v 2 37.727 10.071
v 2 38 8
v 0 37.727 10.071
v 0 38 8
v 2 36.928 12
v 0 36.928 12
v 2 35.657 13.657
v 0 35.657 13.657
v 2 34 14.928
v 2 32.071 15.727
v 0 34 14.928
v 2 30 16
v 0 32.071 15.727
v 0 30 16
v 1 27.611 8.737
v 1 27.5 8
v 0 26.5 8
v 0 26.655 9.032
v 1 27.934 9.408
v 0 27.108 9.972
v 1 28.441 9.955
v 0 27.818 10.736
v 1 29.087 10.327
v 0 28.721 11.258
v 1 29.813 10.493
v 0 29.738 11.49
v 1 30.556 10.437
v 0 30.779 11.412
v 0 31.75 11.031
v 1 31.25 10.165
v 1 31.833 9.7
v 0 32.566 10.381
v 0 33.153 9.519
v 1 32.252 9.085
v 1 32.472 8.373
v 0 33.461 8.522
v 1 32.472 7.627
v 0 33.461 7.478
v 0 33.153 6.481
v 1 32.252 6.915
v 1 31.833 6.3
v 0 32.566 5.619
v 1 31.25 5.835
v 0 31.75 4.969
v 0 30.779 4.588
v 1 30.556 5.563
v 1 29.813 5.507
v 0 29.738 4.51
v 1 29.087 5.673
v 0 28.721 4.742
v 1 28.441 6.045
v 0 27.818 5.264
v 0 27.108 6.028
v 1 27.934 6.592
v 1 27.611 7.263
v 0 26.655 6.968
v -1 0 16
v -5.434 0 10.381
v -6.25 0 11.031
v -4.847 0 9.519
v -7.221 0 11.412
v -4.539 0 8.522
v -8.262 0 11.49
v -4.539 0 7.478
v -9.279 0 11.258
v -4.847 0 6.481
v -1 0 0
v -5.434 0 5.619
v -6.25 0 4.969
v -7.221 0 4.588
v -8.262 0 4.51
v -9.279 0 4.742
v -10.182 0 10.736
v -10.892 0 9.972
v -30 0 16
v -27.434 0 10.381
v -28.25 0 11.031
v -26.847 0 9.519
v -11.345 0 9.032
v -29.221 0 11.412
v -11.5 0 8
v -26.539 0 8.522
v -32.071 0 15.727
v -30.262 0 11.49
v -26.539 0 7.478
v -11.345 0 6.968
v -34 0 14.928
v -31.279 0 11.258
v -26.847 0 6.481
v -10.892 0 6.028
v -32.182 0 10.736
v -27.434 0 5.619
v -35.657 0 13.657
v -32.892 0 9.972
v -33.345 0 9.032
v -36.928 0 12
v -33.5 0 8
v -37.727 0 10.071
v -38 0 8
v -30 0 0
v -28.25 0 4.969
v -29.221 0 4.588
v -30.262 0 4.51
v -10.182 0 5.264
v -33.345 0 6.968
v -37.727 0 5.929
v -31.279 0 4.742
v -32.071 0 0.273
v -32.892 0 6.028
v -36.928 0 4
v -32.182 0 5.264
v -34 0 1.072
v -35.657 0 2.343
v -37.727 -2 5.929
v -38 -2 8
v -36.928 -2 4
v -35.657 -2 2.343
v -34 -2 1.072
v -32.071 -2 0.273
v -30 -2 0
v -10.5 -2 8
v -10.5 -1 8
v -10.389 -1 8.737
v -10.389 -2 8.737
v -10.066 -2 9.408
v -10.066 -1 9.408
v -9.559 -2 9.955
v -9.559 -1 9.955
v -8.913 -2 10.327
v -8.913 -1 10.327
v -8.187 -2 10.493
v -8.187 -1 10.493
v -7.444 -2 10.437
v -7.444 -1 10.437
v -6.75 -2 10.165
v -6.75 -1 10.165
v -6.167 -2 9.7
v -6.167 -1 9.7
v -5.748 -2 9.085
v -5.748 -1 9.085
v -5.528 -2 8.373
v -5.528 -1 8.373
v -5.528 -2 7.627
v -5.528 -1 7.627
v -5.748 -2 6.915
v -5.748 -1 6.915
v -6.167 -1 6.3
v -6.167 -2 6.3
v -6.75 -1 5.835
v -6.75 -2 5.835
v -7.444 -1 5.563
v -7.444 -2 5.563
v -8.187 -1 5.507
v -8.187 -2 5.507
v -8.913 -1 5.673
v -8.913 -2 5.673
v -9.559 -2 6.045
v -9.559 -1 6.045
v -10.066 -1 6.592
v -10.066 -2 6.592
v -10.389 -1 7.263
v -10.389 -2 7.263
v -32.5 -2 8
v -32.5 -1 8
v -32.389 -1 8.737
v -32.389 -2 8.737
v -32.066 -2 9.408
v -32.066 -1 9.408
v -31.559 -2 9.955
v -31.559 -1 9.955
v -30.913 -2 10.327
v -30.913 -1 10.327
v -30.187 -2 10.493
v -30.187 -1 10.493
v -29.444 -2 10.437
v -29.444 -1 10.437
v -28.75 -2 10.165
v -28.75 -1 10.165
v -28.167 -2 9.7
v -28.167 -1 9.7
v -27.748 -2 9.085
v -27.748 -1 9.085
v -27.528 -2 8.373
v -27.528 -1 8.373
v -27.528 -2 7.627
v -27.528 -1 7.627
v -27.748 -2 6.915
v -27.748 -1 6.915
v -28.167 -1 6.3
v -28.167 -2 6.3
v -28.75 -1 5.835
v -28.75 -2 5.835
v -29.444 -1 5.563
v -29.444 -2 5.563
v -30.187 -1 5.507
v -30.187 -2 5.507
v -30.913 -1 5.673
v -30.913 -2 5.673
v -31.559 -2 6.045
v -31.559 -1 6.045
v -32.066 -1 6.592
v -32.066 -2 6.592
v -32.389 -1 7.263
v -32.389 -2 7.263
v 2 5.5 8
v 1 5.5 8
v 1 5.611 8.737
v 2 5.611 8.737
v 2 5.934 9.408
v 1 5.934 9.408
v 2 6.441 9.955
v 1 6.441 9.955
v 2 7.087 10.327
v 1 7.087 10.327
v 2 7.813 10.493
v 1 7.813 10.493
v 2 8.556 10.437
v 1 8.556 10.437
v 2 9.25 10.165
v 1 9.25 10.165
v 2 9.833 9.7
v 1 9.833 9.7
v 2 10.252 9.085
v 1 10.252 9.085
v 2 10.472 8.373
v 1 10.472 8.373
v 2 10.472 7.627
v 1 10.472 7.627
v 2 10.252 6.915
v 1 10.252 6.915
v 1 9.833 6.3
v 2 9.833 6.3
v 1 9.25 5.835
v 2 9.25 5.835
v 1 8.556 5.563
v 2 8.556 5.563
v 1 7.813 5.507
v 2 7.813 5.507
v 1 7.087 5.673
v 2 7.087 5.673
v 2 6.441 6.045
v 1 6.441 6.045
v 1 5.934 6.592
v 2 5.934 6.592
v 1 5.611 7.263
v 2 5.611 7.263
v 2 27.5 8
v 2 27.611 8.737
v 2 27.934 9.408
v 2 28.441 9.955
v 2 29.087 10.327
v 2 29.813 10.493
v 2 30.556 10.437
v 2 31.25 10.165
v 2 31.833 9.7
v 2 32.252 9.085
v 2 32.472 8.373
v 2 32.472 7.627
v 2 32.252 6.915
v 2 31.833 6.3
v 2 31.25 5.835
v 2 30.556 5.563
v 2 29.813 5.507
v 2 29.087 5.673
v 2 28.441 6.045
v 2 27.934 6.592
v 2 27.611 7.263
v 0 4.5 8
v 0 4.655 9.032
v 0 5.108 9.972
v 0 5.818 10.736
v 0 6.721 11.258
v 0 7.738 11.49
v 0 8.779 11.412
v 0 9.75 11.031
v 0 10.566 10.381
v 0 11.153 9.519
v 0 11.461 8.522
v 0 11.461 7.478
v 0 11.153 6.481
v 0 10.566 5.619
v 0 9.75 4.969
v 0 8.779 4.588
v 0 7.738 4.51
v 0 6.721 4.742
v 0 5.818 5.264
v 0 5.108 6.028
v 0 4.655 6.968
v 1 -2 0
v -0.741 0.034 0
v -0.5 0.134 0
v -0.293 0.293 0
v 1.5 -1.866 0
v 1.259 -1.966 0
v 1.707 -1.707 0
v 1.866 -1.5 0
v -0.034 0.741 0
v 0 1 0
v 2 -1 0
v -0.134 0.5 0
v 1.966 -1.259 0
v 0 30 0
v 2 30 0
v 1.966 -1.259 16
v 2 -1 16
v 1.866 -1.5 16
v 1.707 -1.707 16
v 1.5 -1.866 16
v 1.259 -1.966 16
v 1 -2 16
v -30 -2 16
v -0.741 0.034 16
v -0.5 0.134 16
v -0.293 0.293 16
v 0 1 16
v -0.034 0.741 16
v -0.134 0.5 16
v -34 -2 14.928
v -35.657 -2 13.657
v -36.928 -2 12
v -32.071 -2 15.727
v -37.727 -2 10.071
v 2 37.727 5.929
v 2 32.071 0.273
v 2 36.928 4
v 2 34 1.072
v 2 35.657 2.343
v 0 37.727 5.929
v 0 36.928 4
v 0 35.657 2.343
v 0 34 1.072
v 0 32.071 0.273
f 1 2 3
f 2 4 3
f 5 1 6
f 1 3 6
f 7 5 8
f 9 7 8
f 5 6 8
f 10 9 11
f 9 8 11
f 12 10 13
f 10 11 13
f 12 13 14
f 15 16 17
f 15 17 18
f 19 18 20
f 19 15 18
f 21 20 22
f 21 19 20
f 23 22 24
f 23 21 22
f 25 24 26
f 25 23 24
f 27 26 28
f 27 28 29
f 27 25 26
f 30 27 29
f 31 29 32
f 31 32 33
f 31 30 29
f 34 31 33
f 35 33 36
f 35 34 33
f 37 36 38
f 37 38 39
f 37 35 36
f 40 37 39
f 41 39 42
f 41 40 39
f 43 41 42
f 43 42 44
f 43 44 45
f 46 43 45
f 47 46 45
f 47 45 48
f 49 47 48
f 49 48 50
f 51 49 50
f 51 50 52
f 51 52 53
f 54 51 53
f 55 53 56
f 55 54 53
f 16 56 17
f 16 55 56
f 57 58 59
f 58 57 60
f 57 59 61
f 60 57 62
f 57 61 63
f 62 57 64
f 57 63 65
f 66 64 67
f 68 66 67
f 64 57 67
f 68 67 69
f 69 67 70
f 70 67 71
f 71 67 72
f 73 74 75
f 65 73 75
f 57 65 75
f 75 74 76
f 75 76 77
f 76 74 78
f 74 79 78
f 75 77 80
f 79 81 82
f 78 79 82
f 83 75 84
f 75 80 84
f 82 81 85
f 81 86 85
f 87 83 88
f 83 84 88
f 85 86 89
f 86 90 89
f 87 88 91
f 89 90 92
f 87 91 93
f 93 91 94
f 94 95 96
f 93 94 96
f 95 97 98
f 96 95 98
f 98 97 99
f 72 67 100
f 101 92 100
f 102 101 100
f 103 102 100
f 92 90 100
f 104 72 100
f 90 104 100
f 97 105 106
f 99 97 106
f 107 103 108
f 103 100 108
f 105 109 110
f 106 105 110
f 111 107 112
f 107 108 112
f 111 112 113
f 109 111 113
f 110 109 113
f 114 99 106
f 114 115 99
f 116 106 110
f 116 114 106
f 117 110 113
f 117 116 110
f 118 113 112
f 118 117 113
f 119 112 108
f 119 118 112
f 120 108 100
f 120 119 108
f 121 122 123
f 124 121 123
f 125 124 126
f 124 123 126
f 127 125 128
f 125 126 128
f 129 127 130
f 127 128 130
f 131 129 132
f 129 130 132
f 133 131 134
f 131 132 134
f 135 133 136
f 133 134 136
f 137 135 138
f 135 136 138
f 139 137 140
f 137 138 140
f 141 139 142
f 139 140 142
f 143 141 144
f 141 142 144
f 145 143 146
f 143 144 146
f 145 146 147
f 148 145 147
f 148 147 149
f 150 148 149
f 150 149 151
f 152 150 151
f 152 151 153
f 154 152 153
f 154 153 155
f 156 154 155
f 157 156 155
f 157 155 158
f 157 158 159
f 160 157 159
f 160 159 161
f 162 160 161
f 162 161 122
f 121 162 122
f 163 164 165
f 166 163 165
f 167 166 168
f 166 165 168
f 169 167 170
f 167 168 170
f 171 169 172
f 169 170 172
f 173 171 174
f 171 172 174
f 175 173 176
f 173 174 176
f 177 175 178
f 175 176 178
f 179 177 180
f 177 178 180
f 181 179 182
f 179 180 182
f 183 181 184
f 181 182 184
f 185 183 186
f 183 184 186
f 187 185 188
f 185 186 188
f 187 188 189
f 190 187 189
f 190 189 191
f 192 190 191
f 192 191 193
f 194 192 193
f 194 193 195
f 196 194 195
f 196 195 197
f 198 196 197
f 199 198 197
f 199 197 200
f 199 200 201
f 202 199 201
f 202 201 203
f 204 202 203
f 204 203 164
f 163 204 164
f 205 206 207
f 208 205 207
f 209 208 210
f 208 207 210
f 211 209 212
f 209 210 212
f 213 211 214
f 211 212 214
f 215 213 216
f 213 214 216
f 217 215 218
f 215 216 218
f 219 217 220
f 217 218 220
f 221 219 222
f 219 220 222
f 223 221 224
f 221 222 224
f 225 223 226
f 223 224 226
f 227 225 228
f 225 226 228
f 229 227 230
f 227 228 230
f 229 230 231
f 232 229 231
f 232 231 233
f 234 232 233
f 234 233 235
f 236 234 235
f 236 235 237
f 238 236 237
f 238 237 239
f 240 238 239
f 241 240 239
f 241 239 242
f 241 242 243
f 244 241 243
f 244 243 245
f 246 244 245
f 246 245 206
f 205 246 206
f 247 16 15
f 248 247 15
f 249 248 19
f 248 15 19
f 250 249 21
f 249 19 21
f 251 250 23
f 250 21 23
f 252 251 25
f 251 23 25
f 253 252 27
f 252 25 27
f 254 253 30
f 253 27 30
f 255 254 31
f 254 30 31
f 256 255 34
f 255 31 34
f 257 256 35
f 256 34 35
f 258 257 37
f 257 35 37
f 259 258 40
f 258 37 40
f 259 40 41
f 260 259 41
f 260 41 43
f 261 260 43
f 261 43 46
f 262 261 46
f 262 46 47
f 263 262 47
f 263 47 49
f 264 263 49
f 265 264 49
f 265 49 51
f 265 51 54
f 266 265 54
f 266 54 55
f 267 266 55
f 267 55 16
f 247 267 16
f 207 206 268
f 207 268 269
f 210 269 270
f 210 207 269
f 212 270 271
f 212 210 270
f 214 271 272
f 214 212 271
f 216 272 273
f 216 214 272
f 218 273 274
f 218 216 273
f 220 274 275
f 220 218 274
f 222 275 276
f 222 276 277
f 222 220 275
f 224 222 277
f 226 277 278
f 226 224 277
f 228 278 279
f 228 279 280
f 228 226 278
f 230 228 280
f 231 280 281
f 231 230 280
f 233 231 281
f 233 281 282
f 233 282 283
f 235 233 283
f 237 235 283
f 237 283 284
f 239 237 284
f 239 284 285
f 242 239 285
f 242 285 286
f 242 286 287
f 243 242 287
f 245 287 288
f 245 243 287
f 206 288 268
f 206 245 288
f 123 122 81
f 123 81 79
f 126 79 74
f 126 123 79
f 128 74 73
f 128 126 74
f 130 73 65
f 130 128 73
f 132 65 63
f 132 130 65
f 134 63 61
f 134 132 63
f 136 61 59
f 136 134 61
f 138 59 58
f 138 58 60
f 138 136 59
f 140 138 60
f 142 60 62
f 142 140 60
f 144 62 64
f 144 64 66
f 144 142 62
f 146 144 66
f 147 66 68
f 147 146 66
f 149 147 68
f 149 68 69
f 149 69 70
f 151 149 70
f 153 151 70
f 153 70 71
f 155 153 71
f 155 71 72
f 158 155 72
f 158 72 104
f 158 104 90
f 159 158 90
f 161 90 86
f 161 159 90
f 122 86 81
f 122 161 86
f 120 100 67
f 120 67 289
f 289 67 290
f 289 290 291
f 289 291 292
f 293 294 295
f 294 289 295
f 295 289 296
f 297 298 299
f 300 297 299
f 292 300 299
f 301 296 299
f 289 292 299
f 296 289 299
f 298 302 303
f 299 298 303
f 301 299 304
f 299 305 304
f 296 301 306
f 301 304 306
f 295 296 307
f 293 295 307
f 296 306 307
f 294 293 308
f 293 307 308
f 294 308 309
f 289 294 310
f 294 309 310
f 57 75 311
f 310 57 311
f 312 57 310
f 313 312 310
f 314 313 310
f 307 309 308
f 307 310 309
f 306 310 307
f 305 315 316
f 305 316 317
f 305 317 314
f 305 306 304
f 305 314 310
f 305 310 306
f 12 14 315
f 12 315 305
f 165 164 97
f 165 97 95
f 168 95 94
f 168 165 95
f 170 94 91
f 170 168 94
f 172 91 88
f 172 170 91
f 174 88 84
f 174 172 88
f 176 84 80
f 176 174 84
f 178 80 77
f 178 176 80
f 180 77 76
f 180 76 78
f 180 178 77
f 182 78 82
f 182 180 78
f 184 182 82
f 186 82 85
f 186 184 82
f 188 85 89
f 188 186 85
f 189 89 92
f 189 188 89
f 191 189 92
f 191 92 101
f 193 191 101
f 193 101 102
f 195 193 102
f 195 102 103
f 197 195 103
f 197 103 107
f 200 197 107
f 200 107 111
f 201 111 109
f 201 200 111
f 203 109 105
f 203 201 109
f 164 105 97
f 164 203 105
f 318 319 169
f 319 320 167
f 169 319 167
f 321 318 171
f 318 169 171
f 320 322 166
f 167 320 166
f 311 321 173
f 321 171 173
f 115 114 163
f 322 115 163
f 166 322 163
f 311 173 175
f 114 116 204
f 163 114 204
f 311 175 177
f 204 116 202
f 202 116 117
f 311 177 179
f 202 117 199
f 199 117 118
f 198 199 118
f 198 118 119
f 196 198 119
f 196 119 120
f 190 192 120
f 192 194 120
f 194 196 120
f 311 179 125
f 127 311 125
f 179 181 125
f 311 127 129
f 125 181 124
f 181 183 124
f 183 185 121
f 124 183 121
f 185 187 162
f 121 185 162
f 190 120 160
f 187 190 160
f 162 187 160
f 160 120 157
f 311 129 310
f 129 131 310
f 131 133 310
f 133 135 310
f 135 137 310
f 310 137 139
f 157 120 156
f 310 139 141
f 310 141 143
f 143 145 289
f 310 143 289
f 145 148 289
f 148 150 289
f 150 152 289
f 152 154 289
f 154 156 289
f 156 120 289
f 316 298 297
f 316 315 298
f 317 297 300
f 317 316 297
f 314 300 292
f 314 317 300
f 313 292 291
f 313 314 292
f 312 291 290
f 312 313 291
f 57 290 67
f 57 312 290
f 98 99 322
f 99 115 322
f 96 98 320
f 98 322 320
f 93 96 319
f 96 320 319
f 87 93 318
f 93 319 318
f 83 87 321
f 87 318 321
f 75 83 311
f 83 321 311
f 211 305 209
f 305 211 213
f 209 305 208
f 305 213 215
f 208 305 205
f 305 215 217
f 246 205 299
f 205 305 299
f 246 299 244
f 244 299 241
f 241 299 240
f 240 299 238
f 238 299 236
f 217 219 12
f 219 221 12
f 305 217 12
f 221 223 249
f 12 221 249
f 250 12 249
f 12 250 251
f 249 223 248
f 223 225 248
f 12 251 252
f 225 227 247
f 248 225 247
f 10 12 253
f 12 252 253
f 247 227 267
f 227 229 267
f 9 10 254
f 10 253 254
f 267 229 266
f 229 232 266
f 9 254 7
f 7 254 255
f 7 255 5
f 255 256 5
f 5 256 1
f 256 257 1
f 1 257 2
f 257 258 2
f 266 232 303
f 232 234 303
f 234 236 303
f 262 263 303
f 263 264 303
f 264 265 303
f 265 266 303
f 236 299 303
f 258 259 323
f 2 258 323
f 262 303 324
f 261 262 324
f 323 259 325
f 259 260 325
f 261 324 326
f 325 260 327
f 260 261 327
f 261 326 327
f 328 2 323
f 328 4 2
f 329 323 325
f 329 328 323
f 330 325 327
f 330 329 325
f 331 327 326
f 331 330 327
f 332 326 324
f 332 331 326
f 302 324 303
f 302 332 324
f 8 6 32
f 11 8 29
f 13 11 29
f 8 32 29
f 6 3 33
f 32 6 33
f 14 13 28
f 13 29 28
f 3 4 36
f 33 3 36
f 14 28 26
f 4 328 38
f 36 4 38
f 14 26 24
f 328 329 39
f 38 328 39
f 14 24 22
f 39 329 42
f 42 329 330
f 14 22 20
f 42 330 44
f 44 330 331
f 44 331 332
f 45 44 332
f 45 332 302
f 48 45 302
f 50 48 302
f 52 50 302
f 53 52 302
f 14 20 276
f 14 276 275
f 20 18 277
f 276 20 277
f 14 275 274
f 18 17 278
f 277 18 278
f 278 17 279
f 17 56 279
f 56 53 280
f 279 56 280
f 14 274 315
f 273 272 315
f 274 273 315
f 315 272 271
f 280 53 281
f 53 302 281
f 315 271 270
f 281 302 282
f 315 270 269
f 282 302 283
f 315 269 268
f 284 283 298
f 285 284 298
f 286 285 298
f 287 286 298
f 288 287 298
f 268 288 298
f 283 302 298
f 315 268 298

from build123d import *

# Parameters (mm, degrees)
EXTRUDE_1_DEPTH     = 16
FILLET_1_R          = 8
SKETCH_2_R          = 2.5
CUT_EXTRUDE_1_DEPTH = 16
SKETCH_3_R          = 2.5
CUT_EXTRUDE_2_DEPTH = 16
CHAMFER_1_SIZE      = 1
FILLET_2_R          = 1


with BuildPart() as part:
    # 草图1 → 凸台-拉伸1 (new body)
    with BuildSketch(Plane.XY):
        Polygon((0, 38), (0, 0), (-38, 0), (-38, -2), (2, -2), (2, 38), align=None)
    extrude(amount=EXTRUDE_1_DEPTH)

    # 圆角1
    fillet_1_edges = [part.edges().sort_by_distance(p)[0] for p in [
        (-38, -1, 0),
        (-38, -1, 16),
        (1, 38, 16),
        (1, 38, 0),
    ]]
    fillet(fillet_1_edges, radius=FILLET_1_R - 0.0001)  # a hair under: the kernel refuses the full size

    # 草图2 → 切除-拉伸1 (cut)
    with BuildSketch(Plane.ZY):
        with Locations(Location((8, 30, 0), (0, 0, 270))):
            Circle(SKETCH_2_R)
        with Locations(Location((8, 8, 0), (0, 0, 270))):
            Circle(SKETCH_2_R)
    extrude(amount=-CUT_EXTRUDE_1_DEPTH, mode=Mode.SUBTRACT)

    # 草图3 → 切除-拉伸2 (cut)
    with BuildSketch(Plane(origin=(0, 0, 0), x_dir=(1, 0, 0), z_dir=(0, 1, 0))):
        with Locations(Location((-30, -8, 0), (0, 0, 180))):
            Circle(SKETCH_3_R)
        with Locations(Location((-8, -8, 0), (0, 0, 180))):
            Circle(SKETCH_3_R)
    extrude(amount=-CUT_EXTRUDE_2_DEPTH, mode=Mode.SUBTRACT)

    # 倒角1
    chamfer_1_edges = [part.edges().sort_by_distance(p)[0] for p in [
        (0, 32.5, 8),
        (0, 10.5, 8),
        (-27.5, 0, 8),
        (-5.5, 0, 8),
    ]]
    chamfer(chamfer_1_edges, length=CHAMFER_1_SIZE)

    # 圆角2
    fillet_2_edges = [part.edges().sort_by_distance(p)[0] for p in [
        (2, -2, 8),
        (0, 0, 8),
    ]]
    fillet(fillet_2_edges, radius=FILLET_2_R)


solid = part.part
